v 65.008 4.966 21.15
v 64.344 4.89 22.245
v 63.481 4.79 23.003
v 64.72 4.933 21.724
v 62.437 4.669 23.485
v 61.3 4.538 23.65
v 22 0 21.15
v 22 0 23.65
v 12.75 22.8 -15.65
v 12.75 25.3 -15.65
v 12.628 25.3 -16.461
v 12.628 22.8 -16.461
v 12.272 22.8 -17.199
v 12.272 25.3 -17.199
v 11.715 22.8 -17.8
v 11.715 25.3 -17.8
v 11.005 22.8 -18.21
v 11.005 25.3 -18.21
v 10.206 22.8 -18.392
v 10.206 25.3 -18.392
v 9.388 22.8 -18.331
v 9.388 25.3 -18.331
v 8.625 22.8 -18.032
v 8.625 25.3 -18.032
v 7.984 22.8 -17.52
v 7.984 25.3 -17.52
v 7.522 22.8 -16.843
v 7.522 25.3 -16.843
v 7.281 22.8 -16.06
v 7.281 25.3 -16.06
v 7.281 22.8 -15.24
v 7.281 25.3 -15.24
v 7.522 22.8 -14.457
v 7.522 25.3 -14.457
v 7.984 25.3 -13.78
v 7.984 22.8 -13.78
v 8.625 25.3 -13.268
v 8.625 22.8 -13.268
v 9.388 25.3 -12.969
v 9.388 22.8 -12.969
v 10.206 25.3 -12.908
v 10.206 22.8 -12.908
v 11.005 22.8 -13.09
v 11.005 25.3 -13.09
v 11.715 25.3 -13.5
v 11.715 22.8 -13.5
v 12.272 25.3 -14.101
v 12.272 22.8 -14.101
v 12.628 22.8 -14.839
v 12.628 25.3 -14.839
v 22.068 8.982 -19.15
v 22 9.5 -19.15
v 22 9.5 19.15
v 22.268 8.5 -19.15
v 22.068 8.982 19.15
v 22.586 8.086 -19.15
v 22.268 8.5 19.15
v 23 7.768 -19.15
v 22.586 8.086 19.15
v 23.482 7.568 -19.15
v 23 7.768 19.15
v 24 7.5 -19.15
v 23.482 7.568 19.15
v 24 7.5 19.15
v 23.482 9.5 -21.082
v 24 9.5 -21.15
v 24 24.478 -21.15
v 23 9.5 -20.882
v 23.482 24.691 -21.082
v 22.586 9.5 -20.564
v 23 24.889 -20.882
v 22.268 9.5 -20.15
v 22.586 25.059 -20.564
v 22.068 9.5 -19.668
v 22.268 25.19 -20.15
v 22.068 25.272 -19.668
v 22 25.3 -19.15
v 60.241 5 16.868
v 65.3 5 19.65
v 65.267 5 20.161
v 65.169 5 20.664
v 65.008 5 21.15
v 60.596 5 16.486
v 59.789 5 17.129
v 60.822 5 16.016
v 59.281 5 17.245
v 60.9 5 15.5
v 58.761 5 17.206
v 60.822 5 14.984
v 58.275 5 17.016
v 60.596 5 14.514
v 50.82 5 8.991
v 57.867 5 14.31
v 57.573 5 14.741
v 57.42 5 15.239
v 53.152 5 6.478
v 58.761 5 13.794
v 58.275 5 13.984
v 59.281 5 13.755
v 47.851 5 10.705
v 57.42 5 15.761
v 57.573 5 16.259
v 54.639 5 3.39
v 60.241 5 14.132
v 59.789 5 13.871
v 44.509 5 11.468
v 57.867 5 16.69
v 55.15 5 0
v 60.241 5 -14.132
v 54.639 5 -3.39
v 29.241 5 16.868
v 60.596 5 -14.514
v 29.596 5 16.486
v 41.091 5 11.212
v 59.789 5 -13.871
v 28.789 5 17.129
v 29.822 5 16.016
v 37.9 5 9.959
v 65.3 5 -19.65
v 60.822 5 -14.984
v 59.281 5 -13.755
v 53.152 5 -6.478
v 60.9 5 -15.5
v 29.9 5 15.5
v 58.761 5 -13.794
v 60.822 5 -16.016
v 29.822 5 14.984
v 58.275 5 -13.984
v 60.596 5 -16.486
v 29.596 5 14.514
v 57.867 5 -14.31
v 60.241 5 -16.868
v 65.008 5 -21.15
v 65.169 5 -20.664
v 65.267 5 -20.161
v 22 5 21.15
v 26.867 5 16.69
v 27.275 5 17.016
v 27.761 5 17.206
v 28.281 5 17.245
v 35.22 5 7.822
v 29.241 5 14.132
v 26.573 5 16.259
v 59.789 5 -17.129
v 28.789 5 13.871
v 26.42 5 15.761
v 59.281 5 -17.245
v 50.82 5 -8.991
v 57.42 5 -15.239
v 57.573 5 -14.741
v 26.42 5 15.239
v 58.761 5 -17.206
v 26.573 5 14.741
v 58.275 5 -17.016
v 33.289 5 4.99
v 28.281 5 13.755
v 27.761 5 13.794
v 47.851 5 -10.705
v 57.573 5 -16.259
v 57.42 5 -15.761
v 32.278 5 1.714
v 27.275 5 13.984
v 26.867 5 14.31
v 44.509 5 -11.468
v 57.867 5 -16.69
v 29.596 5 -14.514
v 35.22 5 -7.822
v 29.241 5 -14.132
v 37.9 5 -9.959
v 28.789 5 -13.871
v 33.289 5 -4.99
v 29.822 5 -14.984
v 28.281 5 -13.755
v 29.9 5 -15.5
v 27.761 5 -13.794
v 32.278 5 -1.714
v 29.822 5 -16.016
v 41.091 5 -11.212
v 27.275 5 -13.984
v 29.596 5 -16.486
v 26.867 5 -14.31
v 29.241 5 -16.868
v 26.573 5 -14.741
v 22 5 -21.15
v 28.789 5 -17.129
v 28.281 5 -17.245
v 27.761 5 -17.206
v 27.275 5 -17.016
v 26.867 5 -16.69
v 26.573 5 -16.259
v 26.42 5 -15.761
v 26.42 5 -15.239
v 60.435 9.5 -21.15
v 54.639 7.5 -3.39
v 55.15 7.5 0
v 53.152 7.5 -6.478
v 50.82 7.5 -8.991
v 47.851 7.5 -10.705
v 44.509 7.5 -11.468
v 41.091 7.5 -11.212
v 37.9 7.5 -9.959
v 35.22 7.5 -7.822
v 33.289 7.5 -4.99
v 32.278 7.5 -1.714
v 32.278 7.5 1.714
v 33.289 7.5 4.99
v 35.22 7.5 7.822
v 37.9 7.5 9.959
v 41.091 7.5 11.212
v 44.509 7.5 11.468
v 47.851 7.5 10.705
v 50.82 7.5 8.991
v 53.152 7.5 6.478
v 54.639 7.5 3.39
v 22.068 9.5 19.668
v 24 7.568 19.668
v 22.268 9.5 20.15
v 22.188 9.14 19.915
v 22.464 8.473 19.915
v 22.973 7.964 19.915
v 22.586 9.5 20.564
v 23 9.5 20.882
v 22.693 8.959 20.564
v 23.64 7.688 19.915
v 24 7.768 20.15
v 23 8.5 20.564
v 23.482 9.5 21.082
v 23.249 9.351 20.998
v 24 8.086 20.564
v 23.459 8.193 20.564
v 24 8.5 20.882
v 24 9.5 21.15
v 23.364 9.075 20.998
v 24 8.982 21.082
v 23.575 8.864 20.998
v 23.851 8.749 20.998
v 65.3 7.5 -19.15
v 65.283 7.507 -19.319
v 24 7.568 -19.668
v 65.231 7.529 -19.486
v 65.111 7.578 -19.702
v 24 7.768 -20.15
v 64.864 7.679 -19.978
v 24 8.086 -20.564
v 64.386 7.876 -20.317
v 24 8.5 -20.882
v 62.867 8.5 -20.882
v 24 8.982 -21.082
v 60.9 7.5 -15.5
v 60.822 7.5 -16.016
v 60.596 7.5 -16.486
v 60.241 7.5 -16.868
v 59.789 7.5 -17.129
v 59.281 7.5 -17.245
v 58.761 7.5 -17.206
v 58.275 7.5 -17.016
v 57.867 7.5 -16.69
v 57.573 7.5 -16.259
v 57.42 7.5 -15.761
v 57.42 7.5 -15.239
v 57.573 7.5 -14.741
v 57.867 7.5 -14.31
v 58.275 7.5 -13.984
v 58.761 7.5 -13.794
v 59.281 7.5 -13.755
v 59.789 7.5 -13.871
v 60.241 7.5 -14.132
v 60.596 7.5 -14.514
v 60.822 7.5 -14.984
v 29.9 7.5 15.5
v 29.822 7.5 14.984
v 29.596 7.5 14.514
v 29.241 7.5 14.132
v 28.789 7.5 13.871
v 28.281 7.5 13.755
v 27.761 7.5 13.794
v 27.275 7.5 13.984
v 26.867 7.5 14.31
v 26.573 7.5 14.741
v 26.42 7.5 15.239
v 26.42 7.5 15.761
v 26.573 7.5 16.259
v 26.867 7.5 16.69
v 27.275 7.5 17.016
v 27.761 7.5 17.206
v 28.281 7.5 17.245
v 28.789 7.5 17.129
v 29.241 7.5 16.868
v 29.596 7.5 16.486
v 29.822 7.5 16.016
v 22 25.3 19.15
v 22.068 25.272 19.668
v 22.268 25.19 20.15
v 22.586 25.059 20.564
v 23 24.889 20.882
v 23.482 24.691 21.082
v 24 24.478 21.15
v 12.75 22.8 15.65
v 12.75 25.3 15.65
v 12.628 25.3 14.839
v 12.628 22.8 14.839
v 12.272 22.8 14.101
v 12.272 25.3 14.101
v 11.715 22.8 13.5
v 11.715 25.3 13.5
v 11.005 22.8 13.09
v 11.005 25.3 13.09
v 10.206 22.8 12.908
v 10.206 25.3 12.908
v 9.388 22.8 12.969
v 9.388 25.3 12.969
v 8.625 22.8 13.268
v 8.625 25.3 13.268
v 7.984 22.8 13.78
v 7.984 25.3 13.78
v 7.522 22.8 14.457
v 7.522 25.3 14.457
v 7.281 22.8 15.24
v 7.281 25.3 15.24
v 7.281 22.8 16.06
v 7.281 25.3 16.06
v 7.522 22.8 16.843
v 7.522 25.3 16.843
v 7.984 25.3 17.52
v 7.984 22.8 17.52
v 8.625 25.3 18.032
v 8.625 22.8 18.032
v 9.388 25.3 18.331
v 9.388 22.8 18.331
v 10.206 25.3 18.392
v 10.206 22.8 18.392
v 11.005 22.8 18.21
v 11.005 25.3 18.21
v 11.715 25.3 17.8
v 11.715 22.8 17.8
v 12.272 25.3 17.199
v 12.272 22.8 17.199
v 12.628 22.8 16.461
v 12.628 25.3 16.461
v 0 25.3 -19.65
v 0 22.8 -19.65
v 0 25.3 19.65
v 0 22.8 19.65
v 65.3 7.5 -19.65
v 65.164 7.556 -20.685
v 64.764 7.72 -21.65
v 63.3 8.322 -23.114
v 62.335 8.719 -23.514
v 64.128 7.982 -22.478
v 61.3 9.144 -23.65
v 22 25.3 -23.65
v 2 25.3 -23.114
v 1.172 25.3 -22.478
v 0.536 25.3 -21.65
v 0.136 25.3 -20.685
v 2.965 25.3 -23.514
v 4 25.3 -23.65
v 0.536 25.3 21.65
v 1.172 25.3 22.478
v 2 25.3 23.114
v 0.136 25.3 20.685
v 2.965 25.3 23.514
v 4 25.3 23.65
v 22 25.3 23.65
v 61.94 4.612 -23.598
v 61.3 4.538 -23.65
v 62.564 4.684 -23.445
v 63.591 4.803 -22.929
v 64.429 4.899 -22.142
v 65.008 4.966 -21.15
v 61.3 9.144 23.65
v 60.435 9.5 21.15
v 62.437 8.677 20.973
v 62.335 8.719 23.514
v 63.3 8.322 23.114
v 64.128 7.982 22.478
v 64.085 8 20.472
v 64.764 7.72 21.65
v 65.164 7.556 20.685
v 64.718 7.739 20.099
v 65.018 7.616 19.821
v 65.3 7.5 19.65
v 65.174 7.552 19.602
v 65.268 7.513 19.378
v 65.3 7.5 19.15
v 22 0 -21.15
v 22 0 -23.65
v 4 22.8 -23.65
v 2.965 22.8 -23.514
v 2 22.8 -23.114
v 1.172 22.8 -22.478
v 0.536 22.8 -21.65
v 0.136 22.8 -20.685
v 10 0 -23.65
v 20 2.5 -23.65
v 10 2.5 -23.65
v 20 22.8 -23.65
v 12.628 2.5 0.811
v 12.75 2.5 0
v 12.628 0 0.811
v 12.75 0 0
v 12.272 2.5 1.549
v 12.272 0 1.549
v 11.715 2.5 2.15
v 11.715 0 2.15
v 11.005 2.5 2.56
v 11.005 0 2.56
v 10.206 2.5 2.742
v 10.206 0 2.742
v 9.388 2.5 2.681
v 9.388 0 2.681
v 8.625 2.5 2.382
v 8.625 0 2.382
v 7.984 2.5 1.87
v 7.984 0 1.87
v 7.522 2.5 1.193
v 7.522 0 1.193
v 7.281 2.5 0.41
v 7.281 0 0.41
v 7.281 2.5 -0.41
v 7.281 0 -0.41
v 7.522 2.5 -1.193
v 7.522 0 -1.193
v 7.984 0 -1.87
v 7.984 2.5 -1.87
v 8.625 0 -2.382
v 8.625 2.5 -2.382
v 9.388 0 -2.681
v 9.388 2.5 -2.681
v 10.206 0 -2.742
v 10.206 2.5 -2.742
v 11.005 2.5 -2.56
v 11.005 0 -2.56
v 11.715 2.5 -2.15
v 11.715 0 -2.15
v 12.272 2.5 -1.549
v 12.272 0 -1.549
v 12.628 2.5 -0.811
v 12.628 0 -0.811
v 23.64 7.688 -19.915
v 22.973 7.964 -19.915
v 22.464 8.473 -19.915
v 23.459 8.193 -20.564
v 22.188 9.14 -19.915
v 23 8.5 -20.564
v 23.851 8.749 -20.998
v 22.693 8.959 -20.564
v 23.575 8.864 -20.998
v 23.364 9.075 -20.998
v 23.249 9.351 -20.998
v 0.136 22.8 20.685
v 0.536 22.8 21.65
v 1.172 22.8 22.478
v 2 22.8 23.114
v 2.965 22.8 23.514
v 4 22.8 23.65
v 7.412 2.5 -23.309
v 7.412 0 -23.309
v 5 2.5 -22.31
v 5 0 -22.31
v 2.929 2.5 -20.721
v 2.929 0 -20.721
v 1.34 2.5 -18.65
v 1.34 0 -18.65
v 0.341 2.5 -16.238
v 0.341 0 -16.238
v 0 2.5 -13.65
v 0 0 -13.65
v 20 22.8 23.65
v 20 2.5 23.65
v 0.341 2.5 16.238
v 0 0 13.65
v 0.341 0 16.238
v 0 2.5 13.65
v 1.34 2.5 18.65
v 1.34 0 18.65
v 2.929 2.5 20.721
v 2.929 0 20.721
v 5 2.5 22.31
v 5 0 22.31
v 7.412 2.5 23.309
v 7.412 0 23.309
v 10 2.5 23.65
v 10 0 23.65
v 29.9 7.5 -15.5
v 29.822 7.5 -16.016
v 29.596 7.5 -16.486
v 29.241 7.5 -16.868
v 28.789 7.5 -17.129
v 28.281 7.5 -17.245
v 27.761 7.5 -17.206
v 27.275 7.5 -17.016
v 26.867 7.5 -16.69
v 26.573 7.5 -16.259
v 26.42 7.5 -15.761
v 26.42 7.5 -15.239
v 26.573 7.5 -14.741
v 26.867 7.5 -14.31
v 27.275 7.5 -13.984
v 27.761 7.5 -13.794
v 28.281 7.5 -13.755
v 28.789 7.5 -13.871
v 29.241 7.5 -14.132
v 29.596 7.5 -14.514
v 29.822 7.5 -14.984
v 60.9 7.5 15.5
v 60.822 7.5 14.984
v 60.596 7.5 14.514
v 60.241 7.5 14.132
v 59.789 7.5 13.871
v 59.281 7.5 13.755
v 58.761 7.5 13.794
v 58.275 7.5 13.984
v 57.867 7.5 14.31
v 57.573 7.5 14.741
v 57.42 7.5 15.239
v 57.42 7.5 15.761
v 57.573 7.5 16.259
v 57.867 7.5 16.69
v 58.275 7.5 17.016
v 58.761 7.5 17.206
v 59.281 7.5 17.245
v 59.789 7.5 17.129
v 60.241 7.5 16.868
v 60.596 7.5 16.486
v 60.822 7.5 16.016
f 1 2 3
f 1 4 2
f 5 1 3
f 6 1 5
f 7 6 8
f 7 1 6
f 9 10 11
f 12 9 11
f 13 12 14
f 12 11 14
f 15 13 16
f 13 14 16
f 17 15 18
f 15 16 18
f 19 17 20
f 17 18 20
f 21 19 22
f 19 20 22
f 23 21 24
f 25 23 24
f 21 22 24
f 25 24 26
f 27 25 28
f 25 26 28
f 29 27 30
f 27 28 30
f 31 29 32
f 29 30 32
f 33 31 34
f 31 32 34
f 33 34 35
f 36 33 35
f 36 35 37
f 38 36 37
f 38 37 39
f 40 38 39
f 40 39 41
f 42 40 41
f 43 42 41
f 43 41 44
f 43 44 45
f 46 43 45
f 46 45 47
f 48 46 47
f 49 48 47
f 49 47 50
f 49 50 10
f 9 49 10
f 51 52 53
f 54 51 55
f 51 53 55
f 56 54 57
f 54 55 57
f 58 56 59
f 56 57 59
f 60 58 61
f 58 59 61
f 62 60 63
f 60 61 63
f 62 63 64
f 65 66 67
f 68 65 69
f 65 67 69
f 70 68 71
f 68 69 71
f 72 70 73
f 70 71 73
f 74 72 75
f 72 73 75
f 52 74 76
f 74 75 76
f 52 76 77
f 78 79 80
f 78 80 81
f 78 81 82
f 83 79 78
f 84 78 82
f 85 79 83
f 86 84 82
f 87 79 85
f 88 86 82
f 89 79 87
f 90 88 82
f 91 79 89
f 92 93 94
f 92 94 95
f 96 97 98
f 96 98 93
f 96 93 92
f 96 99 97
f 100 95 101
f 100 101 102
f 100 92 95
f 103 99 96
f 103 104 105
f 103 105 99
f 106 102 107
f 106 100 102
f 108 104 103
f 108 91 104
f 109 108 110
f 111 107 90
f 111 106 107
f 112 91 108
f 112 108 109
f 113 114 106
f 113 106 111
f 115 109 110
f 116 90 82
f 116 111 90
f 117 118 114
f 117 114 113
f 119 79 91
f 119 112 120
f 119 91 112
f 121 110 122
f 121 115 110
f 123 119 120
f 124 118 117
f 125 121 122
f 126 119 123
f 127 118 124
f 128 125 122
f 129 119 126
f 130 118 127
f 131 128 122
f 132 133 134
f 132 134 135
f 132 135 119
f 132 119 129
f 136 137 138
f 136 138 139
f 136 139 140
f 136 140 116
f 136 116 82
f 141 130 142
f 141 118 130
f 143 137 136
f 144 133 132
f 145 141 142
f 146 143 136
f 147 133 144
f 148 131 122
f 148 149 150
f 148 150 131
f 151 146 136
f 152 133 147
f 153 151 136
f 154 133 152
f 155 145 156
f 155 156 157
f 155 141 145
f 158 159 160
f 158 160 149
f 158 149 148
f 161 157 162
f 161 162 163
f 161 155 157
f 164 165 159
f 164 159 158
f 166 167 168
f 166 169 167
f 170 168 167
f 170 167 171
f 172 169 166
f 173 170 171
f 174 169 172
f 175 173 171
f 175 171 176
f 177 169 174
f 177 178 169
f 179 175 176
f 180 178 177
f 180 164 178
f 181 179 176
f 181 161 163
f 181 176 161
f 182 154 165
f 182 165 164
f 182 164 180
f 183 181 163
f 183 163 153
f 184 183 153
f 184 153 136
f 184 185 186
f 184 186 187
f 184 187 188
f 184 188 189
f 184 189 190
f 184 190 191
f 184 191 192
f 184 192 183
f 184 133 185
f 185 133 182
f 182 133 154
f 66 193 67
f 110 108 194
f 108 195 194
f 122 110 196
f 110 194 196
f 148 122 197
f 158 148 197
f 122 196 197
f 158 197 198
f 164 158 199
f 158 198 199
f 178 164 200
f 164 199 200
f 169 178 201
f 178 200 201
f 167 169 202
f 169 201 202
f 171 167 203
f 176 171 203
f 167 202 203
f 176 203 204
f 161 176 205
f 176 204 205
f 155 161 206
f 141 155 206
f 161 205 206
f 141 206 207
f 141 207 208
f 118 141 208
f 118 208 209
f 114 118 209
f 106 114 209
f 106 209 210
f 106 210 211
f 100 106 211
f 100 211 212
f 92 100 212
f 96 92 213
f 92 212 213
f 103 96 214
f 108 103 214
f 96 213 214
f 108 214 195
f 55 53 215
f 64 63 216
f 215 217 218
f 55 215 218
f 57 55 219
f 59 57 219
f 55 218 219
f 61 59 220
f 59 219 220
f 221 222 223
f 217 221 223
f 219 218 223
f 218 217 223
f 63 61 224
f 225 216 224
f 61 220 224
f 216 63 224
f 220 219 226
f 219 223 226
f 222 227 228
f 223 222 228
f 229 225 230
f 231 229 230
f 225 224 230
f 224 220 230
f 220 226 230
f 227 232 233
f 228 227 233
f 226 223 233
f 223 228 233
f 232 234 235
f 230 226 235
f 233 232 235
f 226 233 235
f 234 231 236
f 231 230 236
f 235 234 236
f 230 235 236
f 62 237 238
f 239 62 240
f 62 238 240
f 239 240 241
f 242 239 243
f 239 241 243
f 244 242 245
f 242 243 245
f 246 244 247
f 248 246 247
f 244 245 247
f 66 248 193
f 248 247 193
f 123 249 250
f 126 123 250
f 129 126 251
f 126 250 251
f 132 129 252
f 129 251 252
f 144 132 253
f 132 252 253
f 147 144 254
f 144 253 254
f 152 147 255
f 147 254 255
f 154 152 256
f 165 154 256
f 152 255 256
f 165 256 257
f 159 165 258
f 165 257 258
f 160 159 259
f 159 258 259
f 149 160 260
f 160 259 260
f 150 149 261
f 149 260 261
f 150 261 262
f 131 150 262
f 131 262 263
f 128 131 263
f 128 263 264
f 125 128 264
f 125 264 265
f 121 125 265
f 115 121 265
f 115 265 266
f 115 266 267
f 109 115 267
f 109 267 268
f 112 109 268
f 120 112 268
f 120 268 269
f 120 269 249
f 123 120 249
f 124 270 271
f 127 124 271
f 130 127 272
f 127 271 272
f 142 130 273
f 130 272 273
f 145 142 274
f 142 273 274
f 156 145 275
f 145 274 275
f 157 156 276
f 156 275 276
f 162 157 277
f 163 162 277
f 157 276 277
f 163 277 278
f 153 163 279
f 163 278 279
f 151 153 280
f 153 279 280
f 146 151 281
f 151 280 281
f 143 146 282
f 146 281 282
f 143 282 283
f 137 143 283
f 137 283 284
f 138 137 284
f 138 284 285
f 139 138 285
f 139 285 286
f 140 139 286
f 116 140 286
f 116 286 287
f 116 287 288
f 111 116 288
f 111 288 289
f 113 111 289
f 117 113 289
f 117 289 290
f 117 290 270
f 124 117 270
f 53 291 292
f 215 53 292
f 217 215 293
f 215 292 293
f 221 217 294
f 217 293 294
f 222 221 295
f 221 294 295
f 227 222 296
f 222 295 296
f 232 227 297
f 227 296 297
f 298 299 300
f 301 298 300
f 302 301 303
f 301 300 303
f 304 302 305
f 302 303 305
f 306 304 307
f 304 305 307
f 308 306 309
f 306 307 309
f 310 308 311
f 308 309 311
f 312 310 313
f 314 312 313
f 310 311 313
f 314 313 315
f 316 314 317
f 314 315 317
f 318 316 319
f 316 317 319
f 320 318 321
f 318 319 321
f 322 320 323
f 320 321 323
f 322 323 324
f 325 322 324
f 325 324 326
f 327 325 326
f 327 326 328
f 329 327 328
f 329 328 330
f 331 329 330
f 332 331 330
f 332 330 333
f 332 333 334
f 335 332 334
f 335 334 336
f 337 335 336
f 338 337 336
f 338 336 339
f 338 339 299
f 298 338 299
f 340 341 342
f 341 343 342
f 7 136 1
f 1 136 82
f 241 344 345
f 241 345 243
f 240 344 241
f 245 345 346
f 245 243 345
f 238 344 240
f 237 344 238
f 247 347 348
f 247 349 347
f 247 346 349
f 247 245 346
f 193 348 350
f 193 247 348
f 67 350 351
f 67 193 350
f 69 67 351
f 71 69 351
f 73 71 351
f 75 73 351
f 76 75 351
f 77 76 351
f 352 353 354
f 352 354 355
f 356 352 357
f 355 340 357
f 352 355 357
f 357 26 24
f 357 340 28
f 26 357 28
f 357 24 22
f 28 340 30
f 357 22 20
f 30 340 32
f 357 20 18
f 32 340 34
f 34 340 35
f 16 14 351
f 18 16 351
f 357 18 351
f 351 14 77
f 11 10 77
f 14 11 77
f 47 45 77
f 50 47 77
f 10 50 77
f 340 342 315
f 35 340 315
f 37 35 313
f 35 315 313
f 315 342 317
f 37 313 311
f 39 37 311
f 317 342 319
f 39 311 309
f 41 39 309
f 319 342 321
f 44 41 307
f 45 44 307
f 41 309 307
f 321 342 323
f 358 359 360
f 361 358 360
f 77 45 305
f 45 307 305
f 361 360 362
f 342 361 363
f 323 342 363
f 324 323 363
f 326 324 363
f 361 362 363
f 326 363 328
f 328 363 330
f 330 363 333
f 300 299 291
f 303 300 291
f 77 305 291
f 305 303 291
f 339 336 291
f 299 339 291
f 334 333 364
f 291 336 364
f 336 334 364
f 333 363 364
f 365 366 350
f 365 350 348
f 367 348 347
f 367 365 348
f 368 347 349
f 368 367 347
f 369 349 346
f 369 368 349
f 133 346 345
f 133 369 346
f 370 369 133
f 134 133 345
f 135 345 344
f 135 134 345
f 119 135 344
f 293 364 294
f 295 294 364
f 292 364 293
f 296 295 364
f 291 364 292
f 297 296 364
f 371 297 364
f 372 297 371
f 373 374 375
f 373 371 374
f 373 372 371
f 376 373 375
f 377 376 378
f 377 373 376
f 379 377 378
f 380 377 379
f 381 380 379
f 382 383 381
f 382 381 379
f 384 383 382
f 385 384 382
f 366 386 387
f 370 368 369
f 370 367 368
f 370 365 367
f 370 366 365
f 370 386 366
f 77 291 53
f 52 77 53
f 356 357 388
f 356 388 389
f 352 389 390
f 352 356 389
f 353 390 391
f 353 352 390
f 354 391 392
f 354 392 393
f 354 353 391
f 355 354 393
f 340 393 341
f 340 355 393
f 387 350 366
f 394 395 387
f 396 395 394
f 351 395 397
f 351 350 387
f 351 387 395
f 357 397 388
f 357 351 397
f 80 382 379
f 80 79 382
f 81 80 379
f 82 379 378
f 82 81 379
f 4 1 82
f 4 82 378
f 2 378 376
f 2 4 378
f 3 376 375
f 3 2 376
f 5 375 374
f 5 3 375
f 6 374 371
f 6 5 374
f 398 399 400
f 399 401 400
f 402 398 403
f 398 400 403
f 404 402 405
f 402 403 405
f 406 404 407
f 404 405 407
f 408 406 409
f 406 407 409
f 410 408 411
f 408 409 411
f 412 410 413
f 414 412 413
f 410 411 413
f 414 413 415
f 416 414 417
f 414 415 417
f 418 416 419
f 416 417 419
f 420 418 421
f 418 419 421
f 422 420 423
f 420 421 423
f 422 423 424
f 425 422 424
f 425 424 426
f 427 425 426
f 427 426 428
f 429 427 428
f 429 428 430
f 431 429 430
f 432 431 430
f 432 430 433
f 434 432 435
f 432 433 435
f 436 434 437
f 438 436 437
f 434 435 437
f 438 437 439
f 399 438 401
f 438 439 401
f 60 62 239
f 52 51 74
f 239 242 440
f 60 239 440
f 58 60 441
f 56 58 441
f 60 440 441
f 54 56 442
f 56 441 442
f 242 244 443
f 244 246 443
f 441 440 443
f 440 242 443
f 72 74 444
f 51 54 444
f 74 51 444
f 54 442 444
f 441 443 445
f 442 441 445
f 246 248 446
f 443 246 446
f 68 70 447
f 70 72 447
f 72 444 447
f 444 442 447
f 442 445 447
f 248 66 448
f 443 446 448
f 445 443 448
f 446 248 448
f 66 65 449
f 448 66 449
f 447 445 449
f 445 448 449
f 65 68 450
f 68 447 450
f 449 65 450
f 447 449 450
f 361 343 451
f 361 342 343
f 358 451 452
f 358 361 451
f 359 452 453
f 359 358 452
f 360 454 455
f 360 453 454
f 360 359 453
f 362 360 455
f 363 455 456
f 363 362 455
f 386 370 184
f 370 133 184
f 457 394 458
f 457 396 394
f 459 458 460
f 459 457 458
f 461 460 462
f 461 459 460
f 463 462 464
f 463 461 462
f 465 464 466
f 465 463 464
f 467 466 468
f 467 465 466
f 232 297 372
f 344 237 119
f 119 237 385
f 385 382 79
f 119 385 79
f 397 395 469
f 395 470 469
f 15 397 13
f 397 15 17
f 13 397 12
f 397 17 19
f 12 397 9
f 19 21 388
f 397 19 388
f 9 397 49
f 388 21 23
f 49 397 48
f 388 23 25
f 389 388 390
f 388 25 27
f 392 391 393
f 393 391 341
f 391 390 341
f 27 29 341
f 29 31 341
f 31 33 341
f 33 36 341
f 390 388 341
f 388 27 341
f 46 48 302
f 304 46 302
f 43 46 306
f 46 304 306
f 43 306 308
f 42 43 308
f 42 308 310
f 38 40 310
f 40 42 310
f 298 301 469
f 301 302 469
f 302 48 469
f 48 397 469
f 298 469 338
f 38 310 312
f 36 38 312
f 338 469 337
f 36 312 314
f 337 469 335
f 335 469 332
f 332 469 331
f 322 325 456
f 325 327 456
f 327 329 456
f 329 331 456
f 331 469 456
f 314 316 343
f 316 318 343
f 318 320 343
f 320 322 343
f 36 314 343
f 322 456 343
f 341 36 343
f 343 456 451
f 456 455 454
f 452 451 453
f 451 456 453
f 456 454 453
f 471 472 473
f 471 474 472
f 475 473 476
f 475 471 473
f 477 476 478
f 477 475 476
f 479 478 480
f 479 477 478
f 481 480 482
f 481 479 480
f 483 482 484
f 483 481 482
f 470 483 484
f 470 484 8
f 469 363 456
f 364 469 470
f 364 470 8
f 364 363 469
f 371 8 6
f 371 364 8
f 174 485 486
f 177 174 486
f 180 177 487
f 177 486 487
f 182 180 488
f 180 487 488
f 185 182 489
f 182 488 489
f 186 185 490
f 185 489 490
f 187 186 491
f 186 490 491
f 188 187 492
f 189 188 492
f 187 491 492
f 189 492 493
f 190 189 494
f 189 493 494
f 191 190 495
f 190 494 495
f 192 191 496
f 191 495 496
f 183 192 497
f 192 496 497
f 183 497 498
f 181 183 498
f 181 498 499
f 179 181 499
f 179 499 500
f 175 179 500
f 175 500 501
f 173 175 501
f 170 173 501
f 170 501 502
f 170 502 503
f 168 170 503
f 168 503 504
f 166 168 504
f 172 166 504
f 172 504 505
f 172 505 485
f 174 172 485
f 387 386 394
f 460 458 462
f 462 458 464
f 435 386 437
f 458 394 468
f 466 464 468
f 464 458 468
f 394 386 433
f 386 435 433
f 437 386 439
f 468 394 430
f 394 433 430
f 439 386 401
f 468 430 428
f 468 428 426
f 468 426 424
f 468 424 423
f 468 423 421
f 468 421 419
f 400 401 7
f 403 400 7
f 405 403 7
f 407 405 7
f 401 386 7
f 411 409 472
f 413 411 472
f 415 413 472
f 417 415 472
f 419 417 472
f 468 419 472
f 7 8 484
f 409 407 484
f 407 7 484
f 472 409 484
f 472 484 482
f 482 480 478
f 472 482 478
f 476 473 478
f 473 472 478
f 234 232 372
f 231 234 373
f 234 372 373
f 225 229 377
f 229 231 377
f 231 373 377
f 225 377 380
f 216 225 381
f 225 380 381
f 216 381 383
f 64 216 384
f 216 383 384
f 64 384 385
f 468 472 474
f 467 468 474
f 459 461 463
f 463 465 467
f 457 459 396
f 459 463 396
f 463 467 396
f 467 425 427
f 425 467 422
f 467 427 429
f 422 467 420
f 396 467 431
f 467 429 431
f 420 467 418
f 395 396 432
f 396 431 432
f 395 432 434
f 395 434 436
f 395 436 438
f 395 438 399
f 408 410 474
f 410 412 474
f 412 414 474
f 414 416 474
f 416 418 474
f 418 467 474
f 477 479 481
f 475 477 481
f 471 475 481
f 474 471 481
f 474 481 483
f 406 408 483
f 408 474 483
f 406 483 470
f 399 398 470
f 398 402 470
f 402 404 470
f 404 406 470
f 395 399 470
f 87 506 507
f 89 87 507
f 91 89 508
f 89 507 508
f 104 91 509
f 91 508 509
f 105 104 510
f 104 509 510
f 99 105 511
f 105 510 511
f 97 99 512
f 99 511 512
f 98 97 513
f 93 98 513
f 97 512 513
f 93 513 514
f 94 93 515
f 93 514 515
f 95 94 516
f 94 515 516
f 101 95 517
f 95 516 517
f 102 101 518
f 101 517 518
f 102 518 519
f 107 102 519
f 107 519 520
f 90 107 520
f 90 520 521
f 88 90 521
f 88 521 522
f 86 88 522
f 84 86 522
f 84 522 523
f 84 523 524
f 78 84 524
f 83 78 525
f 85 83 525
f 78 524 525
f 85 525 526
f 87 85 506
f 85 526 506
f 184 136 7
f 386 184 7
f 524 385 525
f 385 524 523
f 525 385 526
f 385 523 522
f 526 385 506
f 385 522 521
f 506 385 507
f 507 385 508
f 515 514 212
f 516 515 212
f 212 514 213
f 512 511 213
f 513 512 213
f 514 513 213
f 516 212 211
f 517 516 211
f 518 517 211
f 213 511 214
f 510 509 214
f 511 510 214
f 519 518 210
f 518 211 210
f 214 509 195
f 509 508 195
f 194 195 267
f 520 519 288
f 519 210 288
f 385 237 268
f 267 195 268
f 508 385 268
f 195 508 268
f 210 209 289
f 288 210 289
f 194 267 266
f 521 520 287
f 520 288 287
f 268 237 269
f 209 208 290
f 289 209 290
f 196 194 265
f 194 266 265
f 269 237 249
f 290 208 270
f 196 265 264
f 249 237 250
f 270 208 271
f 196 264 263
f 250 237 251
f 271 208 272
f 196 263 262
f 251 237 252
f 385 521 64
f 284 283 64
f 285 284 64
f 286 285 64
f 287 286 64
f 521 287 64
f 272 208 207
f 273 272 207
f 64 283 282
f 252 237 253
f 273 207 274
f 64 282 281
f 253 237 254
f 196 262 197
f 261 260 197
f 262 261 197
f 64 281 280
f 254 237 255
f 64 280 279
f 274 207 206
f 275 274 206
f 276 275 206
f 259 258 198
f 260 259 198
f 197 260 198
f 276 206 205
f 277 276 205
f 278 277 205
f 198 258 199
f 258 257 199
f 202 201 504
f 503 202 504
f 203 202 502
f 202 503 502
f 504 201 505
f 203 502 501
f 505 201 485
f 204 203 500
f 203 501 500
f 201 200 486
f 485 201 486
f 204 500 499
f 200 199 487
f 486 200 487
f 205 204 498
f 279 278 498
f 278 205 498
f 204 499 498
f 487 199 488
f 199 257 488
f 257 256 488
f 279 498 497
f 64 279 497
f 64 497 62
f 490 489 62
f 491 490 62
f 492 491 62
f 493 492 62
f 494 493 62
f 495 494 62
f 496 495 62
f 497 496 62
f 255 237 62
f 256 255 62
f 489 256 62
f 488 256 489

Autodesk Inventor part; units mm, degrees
ref_plane "YZ Plane" through (0, 0, 0) normal (1, 0, 0) x (0, 1, 0)
ref_plane "XZ Plane" through (0, 0, 0) normal (0, 1, 0) x (-1, 0, 0)
ref_plane "XY Plane" through (0, 0, 0) normal (0, 0, 1) x (1, 0, 0)
sketch "Sketch1" plane through (0, 0, 0) normal (0, 0, 1) x (1, 0, 0)
  line L0 (0, 0) -> (20, 0)
  line L1 (20, 0) -> (20, 2.5) construction
  line L2 (20, 2.5) -> (0, 2.5)
  line L3 (0, 2.5) -> (0, 0)
  line L4 (0, 25.3) -> (20, 25.3)
  line L5 (20, 25.3) -> (20, 22.8) construction
  line L6 (20, 22.8) -> (0, 22.8)
  line L7 (0, 22.8) -> (0, 25.3)
  line L8 (20, 22.8) -> (20, 2.5)
  line L9 (20, 25.3) -> (22, 25.3)
  line L10 (22, 25.3) -> (65.3, 7.5) construction
  line L11 (65.3, 7.5) -> (65.3, 5)
  line L12 (65.3, 5) -> (22, 0) construction
  line L13 (22, 0) -> (20, 0)
  line L14 (22, 25.3) -> (22, 0) construction
  line L15 (22, 25.3) -> (22, 7.5)
  line L16 (65.3, 7.5) -> (22, 7.5)
  line L17 (65.3, 5) -> (22, 5)
  line L18 (22, 5) -> (22, 0)
  dimension "d0" = 2.5
  dimension "d1" = 2.5
  dimension "d2" = 20
  dimension "d3" = 20.3
  dimension "d4" = 2
  dimension "d5" = 43.3
  dimension "d6" = 5
  dimension "d7" = 2.5
extrude "Extrusion1" add sketch "Sketch1" along normal mid plane 42.3
sketch "Sketch2" plane through (0, 0, 21.15) normal (0, 0, 1) x (1, 0, 0)
  line L0 (65.3, 5) -> (65.3, 7.5) projected
  line L1 (65.3, 7.5) -> (22, 7.5) construction
  line L2 (22, 7.5) -> (22, 25.3) construction
  line L3 (22, 25.3) -> (0, 25.3) projected
  line L4 (0, 25.3) -> (0, 22.8) projected
  line L5 (0, 22.8) -> (20, 22.8) projected
  line L6 (20, 22.8) -> (20, 2.5) projected
  line L7 (20, 2.5) -> (0, 2.5) projected
  line L8 (0, 2.5) -> (0, 0) projected
  line L9 (0, 0) -> (22, 0) projected
  line L10 (22, 0) -> (22, 5) construction
  line L11 (22, 5) -> (65.3, 5) construction
  line L12 (22, 7.5) -> (22, 25.3) construction
  line L13 (22, 25.3) -> (65.3, 7.5)
  line L14 (65.3, 5) -> (65.3, 7.5) projected
  line L15 (65.3, 5) -> (22, 0)
extrude "Extrusion2" add sketch "Sketch2" along normal blind 2.5
mirror "Mirror1" about plane through (0, 0, 0) normal (0, 0, 1) of "Extrusion2"
sketch "Sketch3" plane through (0, 25.3, 23.65) normal (0, 1, 0) x (1, 0, 0)
  line L0 (0, 47.3) -> (22, 47.3) projected
  line L1 (10, 47.3) -> (10, 0) construction
  line L2 (0, 0) -> (20, 0) projected
  circle A0 centre (10, 8) radius 2.75
  circle A1 centre (10, 39.3) radius 2.75
  line L3 (0, 47.3) -> (0, 0) projected
  point P0 (0, 23.65)
  dimension "d12" = 8
  dimension "d13" = 8
  dimension "d14" = 5.5
  dimension "d15" = 10
extrude "Extrusion3" cut sketch "Sketch3" against normal up to surface (2.5 mm away)
sketch "Sketch4" plane through (0, 0, 23.65) normal (0, -1, 0) x (1, 0, 0)
  line L0 (0, -23.65) -> (10, -23.65) construction
  circle A0 centre (10, -23.65) radius 2.75
  dimension "d18" = 5.5
  dimension "d19" = 10
extrude "Extrusion4" cut sketch "Sketch4" against normal up to surface (2.5 mm away)
sketch "Sketch5" plane through (22, 7.5, 21.15) normal (0, 1, 0) x (1, 0, 0)
  line L0 (0, 0) -> (0, -2.5) projected
  line L1 (43.3, 42.3) -> (43.3, 44.8) projected
  line L2 (0, 0) -> (43.3, 42.3) construction
  line L3 (6.15, 5.65) -> (37.15, 5.65) construction
  line L4 (37.15, 5.65) -> (37.15, 36.65) construction
  line L5 (37.15, 36.65) -> (6.15, 36.65) construction
  line L6 (6.15, 36.65) -> (6.15, 5.65) construction
  line L7 (6.15, 5.65) -> (37.15, 36.65) construction
  line L8 (37.15, 5.65) -> (6.15, 36.65) construction
  circle A0 centre (6.15, 36.65) radius 1.75
  circle A1 centre (37.15, 36.65) radius 1.75
  circle A2 centre (37.15, 5.65) radius 1.75
  circle A3 centre (6.15, 5.65) radius 1.75
  circle A4 centre (21.65, 21.15) radius 11.5
  point P0 (-22, 21.15)
  dimension "d22" = 31
  dimension "d23" = 31
  dimension "d24" = 3.5
  dimension "d25" = 23
extrude "Extrusion5" cut sketch "Sketch5" against normal through all
fillet "Fillet1" radius 10 2 edges at (0, 1.25, -23.65) (0, 1.25, 23.65)
fillet "Fillet1" radius 4 4 edges at (0, 24.05, -23.65) (0, 24.05, 23.65) (65.3, 6.25, 23.65) (65.3, 6.25, -23.65)
fillet "Fillet1" radius 2 5 edges at (43.65, 7.5, -21.15) (22, 7.5, 0) (43.65, 7.5, 21.15) (22, 16.4, 21.15) (22, 16.4, -21.15)
properties part number "MotorBracket2"
